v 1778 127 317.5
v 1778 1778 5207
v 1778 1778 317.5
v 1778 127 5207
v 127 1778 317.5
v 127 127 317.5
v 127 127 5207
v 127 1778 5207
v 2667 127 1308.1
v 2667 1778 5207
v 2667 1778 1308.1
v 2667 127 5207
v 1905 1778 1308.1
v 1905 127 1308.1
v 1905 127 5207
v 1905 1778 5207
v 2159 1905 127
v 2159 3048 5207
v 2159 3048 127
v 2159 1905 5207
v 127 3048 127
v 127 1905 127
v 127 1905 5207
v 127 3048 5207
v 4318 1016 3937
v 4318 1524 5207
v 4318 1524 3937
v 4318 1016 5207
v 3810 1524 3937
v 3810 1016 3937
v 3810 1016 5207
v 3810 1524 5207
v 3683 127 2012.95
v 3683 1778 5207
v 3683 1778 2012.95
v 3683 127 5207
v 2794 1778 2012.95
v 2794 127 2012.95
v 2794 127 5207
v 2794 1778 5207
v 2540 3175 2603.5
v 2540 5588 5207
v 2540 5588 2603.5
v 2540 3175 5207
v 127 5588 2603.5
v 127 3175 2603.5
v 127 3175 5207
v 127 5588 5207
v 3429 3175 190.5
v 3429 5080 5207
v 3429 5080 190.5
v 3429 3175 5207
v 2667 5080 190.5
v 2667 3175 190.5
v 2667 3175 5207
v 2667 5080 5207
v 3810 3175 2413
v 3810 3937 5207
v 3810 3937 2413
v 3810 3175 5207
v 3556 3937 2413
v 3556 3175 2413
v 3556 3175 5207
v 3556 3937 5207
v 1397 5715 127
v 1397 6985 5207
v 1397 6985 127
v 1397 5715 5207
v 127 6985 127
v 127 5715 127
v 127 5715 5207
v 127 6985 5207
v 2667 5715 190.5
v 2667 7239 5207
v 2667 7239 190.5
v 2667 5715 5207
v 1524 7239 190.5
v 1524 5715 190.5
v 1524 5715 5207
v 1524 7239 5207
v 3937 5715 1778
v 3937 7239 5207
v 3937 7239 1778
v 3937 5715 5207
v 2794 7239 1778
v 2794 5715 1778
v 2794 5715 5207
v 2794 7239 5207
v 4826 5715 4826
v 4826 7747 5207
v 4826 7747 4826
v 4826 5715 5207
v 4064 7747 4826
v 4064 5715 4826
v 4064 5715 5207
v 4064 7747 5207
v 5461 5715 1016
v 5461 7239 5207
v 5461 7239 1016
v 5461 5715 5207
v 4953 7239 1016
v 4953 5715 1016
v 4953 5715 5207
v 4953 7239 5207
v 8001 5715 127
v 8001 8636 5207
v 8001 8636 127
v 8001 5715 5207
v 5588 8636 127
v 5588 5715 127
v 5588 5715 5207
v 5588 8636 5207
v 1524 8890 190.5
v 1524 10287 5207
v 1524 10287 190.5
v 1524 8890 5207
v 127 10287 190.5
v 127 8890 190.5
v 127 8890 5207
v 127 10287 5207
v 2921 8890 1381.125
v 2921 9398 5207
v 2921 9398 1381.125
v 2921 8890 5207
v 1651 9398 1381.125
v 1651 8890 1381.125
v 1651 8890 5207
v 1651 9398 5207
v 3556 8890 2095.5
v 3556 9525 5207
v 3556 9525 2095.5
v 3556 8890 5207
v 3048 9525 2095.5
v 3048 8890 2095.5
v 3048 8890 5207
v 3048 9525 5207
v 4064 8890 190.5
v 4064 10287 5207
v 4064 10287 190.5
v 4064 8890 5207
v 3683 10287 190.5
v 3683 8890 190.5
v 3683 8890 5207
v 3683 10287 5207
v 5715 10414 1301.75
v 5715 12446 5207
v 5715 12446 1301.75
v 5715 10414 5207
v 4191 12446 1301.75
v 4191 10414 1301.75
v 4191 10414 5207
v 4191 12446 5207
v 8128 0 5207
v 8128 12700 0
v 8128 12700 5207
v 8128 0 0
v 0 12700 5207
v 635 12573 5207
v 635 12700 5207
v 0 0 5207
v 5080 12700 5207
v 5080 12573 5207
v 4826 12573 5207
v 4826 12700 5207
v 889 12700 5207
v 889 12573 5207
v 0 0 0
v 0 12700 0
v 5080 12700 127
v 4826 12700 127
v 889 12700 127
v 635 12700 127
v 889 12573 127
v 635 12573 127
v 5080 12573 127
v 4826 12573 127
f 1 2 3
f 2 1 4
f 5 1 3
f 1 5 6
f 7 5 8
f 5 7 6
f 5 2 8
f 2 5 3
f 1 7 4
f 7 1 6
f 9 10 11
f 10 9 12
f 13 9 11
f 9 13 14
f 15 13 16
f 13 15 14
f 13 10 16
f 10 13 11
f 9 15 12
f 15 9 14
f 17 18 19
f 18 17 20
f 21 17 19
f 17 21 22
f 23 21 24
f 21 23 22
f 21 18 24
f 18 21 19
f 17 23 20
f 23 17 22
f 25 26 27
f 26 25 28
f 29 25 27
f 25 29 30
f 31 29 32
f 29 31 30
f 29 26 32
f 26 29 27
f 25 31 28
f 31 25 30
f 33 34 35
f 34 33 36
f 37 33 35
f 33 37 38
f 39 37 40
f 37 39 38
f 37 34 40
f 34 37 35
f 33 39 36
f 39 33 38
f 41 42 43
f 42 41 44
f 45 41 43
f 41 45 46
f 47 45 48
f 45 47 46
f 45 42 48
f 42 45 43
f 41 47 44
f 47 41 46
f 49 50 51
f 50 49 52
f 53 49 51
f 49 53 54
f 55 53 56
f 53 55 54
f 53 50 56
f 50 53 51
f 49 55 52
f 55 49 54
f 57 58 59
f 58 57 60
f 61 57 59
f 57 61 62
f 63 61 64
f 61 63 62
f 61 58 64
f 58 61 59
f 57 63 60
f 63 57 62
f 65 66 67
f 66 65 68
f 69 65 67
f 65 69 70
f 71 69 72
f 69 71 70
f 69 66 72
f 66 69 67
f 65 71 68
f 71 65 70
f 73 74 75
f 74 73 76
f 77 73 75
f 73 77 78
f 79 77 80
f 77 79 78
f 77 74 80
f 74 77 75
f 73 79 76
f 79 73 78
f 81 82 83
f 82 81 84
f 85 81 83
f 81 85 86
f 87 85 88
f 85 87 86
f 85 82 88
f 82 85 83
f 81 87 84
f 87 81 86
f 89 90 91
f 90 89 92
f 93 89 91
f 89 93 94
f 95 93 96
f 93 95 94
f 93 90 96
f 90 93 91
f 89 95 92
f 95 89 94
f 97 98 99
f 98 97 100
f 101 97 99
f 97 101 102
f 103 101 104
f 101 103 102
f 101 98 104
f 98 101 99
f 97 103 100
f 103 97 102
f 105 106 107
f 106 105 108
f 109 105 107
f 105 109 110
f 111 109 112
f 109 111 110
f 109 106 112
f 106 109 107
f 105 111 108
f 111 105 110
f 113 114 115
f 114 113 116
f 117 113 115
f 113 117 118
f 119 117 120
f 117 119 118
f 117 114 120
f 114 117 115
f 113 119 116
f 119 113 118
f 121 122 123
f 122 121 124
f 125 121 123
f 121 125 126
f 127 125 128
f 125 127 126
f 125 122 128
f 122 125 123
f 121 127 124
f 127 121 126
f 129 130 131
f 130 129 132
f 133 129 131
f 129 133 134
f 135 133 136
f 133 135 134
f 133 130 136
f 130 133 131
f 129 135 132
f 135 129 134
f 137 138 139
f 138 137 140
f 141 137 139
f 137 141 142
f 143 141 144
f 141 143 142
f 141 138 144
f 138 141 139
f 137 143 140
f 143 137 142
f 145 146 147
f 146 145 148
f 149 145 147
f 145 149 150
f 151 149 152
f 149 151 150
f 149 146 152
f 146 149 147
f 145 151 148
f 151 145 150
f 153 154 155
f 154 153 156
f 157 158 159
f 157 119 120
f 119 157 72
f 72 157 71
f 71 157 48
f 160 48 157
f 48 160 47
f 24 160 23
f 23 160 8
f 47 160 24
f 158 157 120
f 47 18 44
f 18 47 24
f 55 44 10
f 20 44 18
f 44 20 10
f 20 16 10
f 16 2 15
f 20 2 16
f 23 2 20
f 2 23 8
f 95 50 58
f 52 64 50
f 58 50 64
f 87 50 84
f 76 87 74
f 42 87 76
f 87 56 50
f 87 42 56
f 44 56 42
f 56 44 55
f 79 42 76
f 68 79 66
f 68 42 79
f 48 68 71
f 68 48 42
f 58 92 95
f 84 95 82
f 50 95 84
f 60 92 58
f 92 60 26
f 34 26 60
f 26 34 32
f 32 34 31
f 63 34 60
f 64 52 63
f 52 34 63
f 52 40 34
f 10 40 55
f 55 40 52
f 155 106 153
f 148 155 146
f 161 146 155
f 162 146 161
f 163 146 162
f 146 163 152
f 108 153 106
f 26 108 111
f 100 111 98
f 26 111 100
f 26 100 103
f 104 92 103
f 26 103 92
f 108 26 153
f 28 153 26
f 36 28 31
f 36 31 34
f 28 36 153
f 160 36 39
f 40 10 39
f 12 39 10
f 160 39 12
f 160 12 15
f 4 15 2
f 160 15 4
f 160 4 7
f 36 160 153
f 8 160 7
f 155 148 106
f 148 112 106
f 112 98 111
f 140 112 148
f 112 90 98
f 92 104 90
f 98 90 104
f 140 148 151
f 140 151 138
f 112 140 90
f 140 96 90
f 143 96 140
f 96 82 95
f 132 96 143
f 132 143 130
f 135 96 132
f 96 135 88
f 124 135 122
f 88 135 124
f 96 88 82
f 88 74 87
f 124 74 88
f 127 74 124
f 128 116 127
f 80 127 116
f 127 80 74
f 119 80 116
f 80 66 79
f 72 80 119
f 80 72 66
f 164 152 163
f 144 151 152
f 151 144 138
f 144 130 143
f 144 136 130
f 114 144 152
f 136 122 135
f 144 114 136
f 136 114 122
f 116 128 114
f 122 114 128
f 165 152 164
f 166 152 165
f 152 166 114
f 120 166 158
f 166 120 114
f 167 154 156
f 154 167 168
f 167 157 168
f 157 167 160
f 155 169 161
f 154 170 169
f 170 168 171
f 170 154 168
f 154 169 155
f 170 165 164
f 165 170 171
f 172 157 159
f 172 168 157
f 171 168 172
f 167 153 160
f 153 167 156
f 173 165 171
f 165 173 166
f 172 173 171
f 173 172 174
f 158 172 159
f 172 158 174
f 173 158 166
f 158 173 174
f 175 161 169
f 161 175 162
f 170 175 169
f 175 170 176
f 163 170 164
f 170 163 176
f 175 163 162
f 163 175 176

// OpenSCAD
// Bathroom Organizer
// Internal units: 1/5 inch (0.2")
// scale(5) → inches
// scale(25.4) → mm for slicer

floor_t  = 1;      // solid floor thickness (units)
cavity_h = 40;     // slot cavity depth
tray_h   = cavity_h + floor_t;
stickout = 3;      // desired protrusion above rim
wall     = 1;      // wall thickness

// ---------- Heights ----------

// Pump bottles: top flush with rim
raise_okeefe   = cavity_h - 38.5;
raise_cerave   = cavity_h - 30.7;
raise_cleanser = cavity_h - 40.0;

// Non-pump items
raise_deo       = max(0, cavity_h + stickout - 28.15);
raise_comb      = max(0, cavity_h + stickout - 25);
raise_chapstick = max(0, cavity_h + stickout - 13);
raise_brush     = max(0, cavity_h + stickout - 42.5);

// Cantu: 3u below rim
raise_cantu = max(0, (cavity_h - 3) - 17.5);

// Dental
raise_toothbrush = max(0, cavity_h + stickout - 56.25);
raise_toothpaste = max(0, cavity_h + stickout - 42.5);
raise_nightpaste = max(0, cavity_h + stickout - 30);
raise_nightguard = max(0, cavity_h + stickout - 6);
raise_scraper    = max(0, cavity_h + stickout - 36);
raise_mouthwash  = max(0, cavity_h - 56.25); // flush

// Shaving
raise_gel        = max(0, cavity_h + stickout - 42.5);
raise_aftershave = max(0, cavity_h + stickout - 33.125);
raise_razor      = max(0, cavity_h + stickout - 27.5);
raise_shavette   = max(0, cavity_h + stickout - 42.5);
raise_trimmer    = max(0, cavity_h + stickout - 33.75);

chamfer = 1.5;

// ---------- Slot Module ----------

module slot(x, y, w, d, raise) {
    translate([x, y, floor_t + raise])
        cube([w, d, tray_h - floor_t - raise + 1]);

    if (chamfer > 0) {
        translate([x, y, tray_h - chamfer])
            rotate([-45, 0, 0])
                cube([w,
                      chamfer * sqrt(2),
                      chamfer * sqrt(2)]);
    }
}

// ---------- Overall Dimensions ----------
// 64u = 12.8"
// 100u = 20"
W = 64;
D = 100;

scale(25.4)
scale(5)
difference() {

    cube([W, D, tray_h]);

    // =========================================================
    // EXISTING ITEMS
    // =========================================================

    // --- Skin care (front-left) ---
    slot( 1,  1, 13, 13, raise_okeefe);     // O'Keefe pump
    slot(15,  1,  6, 13, raise_cerave);     // CeraVe pump
    slot( 1, 15, 16,  9, raise_cleanser);   // Cleanser
    slot(30,  8,  4,  4, raise_chapstick);  // Chapstick

    // --- Body ---
    slot(22,  1,  7, 13, raise_deo);        // Speed Stick

    // --- Hair ---
    slot( 1, 25, 19, 19, raise_cantu);      // Cantu
    slot(21, 25,  6, 15, raise_brush);      // Brush
    slot(28, 25,  2,  6, raise_comb);       // Comb

    // =========================================================
    // DENTAL
    // =========================================================

    slot( 1, 45, 10, 10, raise_toothbrush); // Toothbrush charger
    slot(12, 45,  9, 12, raise_toothpaste); // Toothpaste
    slot(22, 45,  9, 12, raise_nightpaste); // Night toothpaste
    slot(32, 45,  6, 16, raise_nightguard); // Night guard
    slot(39, 45,  4, 12, raise_scraper);    // Tongue scraper
    slot(44, 45, 19, 23, raise_mouthwash);  // Mouthwash

    // =========================================================
    // SHAVING
    // =========================================================

    slot( 1, 70, 11, 11, raise_gel);        // Shaving gel
    slot(13, 70, 10,  4, raise_aftershave); // Aftershave
    slot(24, 70,  4,  5, raise_razor);      // Clip razor
    slot(29, 70,  3, 11, raise_shavette);   // Shavette

    // Trimmer charger base against back wall
    slot(33, 82, 12, 16, raise_trimmer);    // Trimmer

    // =========================================================
    // CABLE CHANNELS THROUGH BACK WALL
    // =========================================================

    // Toothbrush charger cable channel
    translate([5, D - wall, floor_t])
        cube([2, wall + 1, tray_h]);

    // Trimmer charger cable channel
    translate([38, D - wall, floor_t])
        cube([2, wall + 1, tray_h]);
}
